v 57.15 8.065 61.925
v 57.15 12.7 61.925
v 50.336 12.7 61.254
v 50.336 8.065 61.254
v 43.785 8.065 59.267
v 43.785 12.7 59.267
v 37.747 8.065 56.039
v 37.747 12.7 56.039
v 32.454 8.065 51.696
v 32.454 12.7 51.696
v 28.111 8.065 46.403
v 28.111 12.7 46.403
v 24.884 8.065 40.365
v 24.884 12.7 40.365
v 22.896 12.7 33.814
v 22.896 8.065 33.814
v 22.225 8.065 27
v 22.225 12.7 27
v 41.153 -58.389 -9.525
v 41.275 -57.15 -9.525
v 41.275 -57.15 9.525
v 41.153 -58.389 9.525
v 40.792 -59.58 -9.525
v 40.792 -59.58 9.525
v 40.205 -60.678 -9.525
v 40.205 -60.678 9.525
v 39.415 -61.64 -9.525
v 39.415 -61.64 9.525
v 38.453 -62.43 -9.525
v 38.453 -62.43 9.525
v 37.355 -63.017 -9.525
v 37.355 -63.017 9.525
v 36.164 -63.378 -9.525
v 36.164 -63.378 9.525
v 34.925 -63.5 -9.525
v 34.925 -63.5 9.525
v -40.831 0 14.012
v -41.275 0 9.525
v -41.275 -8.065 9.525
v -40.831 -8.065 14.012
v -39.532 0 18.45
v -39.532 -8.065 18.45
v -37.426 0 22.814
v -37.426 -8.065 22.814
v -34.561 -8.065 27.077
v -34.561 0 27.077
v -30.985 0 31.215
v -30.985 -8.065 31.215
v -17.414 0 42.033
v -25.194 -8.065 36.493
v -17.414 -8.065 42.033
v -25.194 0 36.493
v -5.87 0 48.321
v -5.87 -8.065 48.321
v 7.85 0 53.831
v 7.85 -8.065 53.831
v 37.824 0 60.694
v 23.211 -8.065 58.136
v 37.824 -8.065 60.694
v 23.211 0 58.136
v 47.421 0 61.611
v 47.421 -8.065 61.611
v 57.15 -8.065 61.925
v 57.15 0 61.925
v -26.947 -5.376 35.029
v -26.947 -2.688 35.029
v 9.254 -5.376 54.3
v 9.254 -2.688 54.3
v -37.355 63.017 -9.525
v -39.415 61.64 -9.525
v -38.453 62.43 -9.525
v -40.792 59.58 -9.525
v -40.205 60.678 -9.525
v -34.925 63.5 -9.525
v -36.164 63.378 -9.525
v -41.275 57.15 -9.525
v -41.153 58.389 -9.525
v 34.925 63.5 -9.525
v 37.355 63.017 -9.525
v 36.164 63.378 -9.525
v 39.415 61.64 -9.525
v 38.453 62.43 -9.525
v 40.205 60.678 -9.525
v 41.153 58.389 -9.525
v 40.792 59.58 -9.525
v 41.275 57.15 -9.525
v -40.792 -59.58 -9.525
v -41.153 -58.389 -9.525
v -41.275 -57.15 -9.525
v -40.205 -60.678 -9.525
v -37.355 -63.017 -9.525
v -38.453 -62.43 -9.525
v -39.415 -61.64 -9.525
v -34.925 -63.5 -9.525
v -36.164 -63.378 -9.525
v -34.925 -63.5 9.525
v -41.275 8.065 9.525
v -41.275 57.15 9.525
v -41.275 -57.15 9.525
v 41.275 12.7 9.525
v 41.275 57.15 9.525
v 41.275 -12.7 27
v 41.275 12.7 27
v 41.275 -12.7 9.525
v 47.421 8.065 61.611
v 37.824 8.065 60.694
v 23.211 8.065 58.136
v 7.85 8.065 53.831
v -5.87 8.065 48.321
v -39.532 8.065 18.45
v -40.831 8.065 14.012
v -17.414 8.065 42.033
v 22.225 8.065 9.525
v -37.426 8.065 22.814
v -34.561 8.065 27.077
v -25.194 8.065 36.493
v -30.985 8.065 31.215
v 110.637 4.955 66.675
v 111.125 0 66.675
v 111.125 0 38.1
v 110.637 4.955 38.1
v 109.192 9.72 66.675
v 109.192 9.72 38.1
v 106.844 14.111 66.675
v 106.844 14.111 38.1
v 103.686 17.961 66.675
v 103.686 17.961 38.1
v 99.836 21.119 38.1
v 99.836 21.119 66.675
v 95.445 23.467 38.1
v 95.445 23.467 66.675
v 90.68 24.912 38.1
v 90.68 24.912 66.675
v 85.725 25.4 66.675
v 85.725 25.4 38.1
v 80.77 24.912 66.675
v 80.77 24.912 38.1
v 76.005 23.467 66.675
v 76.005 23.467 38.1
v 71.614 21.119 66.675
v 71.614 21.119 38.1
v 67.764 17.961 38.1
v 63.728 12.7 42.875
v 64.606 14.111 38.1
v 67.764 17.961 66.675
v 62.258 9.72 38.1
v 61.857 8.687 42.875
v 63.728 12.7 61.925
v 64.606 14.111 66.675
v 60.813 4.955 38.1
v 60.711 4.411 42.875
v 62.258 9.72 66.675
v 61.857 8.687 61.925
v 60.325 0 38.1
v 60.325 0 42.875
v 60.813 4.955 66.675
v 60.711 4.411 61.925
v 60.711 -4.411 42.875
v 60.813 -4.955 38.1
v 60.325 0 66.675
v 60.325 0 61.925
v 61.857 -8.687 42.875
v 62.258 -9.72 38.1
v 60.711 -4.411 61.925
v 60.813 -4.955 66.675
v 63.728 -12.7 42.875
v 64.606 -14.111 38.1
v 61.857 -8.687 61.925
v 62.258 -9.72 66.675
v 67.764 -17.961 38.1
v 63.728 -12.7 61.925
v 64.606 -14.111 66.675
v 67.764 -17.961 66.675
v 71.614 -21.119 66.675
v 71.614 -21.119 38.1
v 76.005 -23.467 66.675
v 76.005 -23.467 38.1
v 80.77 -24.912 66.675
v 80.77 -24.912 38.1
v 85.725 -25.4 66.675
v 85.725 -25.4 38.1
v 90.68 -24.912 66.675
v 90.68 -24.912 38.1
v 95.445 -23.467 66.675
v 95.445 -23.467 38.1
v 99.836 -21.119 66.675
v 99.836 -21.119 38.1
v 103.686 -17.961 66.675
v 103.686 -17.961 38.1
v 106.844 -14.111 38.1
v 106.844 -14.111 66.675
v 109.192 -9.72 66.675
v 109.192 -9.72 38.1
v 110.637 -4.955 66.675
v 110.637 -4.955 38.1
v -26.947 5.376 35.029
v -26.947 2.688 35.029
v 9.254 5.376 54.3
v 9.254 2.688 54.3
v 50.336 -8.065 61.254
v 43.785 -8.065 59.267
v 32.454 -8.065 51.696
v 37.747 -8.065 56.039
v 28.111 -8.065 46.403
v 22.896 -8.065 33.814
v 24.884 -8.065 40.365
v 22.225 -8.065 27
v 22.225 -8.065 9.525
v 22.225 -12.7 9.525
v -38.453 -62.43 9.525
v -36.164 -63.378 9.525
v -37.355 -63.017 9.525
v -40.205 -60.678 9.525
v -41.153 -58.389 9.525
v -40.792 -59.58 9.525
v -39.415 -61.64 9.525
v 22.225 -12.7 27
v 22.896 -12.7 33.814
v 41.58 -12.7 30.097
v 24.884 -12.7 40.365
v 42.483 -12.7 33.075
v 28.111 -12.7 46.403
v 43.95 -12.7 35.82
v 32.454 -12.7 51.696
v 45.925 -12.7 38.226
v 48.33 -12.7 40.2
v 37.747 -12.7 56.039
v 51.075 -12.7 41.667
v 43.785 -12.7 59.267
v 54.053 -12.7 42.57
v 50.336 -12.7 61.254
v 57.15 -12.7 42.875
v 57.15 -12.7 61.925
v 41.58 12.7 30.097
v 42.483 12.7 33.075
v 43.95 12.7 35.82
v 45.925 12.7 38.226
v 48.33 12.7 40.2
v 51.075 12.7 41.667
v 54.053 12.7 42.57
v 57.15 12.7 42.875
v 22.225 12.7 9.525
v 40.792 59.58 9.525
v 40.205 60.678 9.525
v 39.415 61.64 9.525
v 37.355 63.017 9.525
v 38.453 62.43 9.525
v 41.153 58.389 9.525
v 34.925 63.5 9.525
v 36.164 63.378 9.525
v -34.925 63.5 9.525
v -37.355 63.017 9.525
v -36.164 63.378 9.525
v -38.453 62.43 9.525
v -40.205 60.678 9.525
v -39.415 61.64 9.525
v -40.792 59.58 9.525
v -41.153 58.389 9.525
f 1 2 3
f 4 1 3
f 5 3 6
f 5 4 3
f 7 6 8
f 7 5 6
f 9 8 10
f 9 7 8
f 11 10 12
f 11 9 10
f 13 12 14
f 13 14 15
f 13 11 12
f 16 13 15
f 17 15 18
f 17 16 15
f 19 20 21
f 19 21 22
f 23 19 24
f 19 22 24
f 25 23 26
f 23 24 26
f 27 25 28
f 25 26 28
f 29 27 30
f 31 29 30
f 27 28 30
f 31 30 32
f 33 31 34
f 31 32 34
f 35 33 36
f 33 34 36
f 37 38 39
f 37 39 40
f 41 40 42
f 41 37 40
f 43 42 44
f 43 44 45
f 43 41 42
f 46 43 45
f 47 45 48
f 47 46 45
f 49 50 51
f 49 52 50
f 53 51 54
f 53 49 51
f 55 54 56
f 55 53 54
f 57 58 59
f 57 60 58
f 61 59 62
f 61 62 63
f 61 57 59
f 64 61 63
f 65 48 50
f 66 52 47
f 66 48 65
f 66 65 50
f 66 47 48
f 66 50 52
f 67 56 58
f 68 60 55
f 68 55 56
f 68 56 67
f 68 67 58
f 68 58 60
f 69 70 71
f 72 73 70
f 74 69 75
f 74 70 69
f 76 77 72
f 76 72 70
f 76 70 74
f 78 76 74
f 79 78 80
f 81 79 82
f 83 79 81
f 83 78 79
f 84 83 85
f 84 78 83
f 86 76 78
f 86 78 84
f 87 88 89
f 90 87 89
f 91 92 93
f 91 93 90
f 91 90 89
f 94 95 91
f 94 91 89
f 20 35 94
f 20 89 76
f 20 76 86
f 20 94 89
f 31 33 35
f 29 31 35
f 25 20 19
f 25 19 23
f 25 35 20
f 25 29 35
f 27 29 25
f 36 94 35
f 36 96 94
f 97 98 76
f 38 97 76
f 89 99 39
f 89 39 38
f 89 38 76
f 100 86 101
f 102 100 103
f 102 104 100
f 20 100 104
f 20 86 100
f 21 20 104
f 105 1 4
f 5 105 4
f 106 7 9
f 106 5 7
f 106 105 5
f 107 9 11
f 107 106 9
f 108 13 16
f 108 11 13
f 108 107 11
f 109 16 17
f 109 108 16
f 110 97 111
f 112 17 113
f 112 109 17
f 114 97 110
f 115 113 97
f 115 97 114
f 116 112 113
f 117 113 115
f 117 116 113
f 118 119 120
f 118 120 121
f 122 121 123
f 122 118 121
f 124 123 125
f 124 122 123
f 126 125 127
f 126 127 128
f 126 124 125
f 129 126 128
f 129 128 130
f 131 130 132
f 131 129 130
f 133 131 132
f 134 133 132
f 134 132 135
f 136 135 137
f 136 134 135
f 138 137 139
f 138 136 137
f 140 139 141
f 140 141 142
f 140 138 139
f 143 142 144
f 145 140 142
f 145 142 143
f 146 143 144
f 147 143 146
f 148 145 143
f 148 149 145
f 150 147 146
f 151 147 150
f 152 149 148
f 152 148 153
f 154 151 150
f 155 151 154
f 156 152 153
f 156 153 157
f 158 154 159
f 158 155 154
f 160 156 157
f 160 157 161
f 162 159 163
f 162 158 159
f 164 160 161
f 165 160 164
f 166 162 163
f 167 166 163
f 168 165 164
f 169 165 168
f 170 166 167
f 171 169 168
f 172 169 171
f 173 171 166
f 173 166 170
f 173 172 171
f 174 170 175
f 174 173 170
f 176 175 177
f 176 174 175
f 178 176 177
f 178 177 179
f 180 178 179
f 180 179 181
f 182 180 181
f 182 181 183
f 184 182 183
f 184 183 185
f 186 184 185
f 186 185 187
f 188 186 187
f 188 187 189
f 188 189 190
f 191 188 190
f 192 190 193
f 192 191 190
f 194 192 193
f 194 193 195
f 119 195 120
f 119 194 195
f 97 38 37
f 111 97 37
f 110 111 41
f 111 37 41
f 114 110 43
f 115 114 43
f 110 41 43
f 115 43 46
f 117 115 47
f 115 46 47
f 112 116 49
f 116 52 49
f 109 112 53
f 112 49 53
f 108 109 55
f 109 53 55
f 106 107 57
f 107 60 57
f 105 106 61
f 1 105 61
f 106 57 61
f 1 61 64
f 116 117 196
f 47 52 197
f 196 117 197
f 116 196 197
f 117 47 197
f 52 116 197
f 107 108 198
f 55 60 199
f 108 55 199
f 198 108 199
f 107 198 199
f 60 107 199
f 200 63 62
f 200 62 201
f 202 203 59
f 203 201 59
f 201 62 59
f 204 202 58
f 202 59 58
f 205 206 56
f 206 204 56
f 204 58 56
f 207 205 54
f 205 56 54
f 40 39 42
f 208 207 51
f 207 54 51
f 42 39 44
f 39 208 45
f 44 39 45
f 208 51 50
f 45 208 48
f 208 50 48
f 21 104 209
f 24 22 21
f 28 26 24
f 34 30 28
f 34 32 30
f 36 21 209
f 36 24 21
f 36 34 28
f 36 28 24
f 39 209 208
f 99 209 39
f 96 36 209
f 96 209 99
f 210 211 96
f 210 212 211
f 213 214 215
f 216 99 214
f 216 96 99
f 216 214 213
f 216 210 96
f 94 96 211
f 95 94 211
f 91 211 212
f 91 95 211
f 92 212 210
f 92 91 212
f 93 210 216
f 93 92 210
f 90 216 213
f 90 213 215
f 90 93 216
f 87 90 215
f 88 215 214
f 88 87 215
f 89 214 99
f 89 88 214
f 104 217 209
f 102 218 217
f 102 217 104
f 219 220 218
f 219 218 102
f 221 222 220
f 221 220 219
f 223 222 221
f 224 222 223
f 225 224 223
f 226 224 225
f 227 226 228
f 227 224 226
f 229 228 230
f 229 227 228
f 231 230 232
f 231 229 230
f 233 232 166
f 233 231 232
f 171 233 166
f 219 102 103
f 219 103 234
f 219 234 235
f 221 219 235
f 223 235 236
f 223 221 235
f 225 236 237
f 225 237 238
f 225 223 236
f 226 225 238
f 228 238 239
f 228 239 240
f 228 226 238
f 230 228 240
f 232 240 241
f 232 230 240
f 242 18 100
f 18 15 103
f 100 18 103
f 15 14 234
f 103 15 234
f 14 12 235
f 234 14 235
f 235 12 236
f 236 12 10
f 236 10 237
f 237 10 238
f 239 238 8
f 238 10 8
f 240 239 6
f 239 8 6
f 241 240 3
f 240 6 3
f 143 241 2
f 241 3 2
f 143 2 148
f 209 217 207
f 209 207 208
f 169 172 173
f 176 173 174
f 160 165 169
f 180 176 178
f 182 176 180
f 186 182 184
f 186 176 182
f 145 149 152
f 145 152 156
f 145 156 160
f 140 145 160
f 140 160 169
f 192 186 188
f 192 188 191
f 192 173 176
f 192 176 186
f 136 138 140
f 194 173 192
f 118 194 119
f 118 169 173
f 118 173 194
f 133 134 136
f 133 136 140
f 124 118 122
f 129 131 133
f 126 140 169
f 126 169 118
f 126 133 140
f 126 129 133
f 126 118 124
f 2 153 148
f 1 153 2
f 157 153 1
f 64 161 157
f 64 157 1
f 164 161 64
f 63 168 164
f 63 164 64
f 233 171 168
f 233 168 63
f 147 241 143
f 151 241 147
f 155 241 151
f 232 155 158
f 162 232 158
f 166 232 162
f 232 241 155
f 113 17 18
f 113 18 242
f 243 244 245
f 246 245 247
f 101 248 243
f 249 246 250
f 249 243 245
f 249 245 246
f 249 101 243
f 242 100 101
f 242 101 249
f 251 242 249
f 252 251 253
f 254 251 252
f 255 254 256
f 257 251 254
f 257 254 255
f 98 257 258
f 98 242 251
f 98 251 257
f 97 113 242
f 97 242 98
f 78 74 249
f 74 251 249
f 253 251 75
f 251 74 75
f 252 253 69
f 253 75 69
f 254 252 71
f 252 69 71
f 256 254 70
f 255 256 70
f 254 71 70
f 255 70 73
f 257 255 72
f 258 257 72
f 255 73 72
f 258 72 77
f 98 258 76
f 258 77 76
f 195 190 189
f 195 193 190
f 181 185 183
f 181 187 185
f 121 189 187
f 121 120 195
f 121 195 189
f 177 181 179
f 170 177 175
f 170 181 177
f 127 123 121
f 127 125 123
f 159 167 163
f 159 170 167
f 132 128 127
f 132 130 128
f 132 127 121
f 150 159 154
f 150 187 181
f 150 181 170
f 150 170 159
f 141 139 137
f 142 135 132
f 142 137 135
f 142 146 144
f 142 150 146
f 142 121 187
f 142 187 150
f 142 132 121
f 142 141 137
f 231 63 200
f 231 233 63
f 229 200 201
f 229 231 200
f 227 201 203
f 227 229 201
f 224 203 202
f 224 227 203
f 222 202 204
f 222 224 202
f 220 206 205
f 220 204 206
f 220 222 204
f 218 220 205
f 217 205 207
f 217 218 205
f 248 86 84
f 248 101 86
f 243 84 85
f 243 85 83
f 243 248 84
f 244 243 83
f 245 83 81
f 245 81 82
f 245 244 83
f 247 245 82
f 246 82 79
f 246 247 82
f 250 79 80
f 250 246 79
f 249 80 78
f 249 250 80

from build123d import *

# Parameters (mm, degrees)
F1_DEPTH = 63.5
F2_DEPTH = 12.7
F3_DEPTH = 8.0645
F5_R     = 6.35


# Not quite as in the source:
# - ends of sketch curves that miss each other by under 0.0002 mm in the source are joined


with BuildPart() as f1:
    # F0 (on Front) → F1 (new body, symmetric)
    with BuildSketch(Plane.XZ):
        Polygon((-41.275, -9.525), (41.275, -9.525), (41.275, 9.525), (22.225, 9.525), (-41.275, 9.525), align=None)
    extrude(amount=F1_DEPTH, both=True)

    # F0 (on Front) → F2 (join, symmetric)
    with BuildSketch(Plane.XZ):
        with BuildLine():
            Line((22.225, 9.525), (41.275, 9.525))
            Line((41.275, 9.525), (41.275, 27.0002))
            ThreePointArc((41.275, 27.0002), (45.9246798487, 38.2255201513), (57.15, 42.8752))
            Line((57.15, 42.8752), (60.325, 42.8752))
            Line((60.325, 42.8752), (60.325, 61.9252))
            Line((60.325, 61.9252), (57.15, 61.9252))
            ThreePointArc((57.15, 61.9252), (32.4542956671, 51.6959043329), (22.225, 27.0002))
            Line((22.225, 27.0002), (22.225, 9.525))
        make_face()
        Polygon((85.7250011283, 61.9252), (60.325, 61.9252), (60.325, 42.8752), (85.725, 42.8752), align=None)
    extrude(amount=F2_DEPTH, both=True)

    # F0 (on Front) → F3 (join, symmetric)
    with BuildSketch(Plane.XZ):
        with BuildLine():
            add(Edge.make_bspline(
                [(-41.275, 9.525), (-41.275, 36.3431351324), (6.7984250959, 61.9252), (57.15, 61.9252)],
                knots=[0, 0, 0, 0, 111.5045361635, 111.5045361635, 111.5045361635, 111.5045361635], degree=3))
            Line((-41.275, 9.525), (22.225, 9.525))
            Line((22.225, 9.525), (22.225, 27.0002))
            ThreePointArc((22.225, 27.0002), (32.4542956671, 51.6959043329), (57.15, 61.9252))
        make_face()
    extrude(amount=F3_DEPTH, both=True)

    # F0 (on Front) → F4 (revolve)
    with BuildSketch(Plane.XZ):
        Polygon((85.725, 66.675), (85.725, 61.9252), (85.725, 42.8752), (85.725, 38.1), (111.125, 38.1), (111.125, 66.675), align=None)
    revolve(axis=Axis((85.725, 0, 52.3875), (0, 0, 1)))

    # F5
    f5_edges = [f1.edges().sort_by_distance(p)[0] for p in [
        (41.275, -63.5, 0),
        (-41.275, -63.5, 0),
        (-41.275, 63.5, 0),
        (41.275, 63.5, 0),
    ]]
    fillet(f5_edges, radius=F5_R)


solid = f1.part
